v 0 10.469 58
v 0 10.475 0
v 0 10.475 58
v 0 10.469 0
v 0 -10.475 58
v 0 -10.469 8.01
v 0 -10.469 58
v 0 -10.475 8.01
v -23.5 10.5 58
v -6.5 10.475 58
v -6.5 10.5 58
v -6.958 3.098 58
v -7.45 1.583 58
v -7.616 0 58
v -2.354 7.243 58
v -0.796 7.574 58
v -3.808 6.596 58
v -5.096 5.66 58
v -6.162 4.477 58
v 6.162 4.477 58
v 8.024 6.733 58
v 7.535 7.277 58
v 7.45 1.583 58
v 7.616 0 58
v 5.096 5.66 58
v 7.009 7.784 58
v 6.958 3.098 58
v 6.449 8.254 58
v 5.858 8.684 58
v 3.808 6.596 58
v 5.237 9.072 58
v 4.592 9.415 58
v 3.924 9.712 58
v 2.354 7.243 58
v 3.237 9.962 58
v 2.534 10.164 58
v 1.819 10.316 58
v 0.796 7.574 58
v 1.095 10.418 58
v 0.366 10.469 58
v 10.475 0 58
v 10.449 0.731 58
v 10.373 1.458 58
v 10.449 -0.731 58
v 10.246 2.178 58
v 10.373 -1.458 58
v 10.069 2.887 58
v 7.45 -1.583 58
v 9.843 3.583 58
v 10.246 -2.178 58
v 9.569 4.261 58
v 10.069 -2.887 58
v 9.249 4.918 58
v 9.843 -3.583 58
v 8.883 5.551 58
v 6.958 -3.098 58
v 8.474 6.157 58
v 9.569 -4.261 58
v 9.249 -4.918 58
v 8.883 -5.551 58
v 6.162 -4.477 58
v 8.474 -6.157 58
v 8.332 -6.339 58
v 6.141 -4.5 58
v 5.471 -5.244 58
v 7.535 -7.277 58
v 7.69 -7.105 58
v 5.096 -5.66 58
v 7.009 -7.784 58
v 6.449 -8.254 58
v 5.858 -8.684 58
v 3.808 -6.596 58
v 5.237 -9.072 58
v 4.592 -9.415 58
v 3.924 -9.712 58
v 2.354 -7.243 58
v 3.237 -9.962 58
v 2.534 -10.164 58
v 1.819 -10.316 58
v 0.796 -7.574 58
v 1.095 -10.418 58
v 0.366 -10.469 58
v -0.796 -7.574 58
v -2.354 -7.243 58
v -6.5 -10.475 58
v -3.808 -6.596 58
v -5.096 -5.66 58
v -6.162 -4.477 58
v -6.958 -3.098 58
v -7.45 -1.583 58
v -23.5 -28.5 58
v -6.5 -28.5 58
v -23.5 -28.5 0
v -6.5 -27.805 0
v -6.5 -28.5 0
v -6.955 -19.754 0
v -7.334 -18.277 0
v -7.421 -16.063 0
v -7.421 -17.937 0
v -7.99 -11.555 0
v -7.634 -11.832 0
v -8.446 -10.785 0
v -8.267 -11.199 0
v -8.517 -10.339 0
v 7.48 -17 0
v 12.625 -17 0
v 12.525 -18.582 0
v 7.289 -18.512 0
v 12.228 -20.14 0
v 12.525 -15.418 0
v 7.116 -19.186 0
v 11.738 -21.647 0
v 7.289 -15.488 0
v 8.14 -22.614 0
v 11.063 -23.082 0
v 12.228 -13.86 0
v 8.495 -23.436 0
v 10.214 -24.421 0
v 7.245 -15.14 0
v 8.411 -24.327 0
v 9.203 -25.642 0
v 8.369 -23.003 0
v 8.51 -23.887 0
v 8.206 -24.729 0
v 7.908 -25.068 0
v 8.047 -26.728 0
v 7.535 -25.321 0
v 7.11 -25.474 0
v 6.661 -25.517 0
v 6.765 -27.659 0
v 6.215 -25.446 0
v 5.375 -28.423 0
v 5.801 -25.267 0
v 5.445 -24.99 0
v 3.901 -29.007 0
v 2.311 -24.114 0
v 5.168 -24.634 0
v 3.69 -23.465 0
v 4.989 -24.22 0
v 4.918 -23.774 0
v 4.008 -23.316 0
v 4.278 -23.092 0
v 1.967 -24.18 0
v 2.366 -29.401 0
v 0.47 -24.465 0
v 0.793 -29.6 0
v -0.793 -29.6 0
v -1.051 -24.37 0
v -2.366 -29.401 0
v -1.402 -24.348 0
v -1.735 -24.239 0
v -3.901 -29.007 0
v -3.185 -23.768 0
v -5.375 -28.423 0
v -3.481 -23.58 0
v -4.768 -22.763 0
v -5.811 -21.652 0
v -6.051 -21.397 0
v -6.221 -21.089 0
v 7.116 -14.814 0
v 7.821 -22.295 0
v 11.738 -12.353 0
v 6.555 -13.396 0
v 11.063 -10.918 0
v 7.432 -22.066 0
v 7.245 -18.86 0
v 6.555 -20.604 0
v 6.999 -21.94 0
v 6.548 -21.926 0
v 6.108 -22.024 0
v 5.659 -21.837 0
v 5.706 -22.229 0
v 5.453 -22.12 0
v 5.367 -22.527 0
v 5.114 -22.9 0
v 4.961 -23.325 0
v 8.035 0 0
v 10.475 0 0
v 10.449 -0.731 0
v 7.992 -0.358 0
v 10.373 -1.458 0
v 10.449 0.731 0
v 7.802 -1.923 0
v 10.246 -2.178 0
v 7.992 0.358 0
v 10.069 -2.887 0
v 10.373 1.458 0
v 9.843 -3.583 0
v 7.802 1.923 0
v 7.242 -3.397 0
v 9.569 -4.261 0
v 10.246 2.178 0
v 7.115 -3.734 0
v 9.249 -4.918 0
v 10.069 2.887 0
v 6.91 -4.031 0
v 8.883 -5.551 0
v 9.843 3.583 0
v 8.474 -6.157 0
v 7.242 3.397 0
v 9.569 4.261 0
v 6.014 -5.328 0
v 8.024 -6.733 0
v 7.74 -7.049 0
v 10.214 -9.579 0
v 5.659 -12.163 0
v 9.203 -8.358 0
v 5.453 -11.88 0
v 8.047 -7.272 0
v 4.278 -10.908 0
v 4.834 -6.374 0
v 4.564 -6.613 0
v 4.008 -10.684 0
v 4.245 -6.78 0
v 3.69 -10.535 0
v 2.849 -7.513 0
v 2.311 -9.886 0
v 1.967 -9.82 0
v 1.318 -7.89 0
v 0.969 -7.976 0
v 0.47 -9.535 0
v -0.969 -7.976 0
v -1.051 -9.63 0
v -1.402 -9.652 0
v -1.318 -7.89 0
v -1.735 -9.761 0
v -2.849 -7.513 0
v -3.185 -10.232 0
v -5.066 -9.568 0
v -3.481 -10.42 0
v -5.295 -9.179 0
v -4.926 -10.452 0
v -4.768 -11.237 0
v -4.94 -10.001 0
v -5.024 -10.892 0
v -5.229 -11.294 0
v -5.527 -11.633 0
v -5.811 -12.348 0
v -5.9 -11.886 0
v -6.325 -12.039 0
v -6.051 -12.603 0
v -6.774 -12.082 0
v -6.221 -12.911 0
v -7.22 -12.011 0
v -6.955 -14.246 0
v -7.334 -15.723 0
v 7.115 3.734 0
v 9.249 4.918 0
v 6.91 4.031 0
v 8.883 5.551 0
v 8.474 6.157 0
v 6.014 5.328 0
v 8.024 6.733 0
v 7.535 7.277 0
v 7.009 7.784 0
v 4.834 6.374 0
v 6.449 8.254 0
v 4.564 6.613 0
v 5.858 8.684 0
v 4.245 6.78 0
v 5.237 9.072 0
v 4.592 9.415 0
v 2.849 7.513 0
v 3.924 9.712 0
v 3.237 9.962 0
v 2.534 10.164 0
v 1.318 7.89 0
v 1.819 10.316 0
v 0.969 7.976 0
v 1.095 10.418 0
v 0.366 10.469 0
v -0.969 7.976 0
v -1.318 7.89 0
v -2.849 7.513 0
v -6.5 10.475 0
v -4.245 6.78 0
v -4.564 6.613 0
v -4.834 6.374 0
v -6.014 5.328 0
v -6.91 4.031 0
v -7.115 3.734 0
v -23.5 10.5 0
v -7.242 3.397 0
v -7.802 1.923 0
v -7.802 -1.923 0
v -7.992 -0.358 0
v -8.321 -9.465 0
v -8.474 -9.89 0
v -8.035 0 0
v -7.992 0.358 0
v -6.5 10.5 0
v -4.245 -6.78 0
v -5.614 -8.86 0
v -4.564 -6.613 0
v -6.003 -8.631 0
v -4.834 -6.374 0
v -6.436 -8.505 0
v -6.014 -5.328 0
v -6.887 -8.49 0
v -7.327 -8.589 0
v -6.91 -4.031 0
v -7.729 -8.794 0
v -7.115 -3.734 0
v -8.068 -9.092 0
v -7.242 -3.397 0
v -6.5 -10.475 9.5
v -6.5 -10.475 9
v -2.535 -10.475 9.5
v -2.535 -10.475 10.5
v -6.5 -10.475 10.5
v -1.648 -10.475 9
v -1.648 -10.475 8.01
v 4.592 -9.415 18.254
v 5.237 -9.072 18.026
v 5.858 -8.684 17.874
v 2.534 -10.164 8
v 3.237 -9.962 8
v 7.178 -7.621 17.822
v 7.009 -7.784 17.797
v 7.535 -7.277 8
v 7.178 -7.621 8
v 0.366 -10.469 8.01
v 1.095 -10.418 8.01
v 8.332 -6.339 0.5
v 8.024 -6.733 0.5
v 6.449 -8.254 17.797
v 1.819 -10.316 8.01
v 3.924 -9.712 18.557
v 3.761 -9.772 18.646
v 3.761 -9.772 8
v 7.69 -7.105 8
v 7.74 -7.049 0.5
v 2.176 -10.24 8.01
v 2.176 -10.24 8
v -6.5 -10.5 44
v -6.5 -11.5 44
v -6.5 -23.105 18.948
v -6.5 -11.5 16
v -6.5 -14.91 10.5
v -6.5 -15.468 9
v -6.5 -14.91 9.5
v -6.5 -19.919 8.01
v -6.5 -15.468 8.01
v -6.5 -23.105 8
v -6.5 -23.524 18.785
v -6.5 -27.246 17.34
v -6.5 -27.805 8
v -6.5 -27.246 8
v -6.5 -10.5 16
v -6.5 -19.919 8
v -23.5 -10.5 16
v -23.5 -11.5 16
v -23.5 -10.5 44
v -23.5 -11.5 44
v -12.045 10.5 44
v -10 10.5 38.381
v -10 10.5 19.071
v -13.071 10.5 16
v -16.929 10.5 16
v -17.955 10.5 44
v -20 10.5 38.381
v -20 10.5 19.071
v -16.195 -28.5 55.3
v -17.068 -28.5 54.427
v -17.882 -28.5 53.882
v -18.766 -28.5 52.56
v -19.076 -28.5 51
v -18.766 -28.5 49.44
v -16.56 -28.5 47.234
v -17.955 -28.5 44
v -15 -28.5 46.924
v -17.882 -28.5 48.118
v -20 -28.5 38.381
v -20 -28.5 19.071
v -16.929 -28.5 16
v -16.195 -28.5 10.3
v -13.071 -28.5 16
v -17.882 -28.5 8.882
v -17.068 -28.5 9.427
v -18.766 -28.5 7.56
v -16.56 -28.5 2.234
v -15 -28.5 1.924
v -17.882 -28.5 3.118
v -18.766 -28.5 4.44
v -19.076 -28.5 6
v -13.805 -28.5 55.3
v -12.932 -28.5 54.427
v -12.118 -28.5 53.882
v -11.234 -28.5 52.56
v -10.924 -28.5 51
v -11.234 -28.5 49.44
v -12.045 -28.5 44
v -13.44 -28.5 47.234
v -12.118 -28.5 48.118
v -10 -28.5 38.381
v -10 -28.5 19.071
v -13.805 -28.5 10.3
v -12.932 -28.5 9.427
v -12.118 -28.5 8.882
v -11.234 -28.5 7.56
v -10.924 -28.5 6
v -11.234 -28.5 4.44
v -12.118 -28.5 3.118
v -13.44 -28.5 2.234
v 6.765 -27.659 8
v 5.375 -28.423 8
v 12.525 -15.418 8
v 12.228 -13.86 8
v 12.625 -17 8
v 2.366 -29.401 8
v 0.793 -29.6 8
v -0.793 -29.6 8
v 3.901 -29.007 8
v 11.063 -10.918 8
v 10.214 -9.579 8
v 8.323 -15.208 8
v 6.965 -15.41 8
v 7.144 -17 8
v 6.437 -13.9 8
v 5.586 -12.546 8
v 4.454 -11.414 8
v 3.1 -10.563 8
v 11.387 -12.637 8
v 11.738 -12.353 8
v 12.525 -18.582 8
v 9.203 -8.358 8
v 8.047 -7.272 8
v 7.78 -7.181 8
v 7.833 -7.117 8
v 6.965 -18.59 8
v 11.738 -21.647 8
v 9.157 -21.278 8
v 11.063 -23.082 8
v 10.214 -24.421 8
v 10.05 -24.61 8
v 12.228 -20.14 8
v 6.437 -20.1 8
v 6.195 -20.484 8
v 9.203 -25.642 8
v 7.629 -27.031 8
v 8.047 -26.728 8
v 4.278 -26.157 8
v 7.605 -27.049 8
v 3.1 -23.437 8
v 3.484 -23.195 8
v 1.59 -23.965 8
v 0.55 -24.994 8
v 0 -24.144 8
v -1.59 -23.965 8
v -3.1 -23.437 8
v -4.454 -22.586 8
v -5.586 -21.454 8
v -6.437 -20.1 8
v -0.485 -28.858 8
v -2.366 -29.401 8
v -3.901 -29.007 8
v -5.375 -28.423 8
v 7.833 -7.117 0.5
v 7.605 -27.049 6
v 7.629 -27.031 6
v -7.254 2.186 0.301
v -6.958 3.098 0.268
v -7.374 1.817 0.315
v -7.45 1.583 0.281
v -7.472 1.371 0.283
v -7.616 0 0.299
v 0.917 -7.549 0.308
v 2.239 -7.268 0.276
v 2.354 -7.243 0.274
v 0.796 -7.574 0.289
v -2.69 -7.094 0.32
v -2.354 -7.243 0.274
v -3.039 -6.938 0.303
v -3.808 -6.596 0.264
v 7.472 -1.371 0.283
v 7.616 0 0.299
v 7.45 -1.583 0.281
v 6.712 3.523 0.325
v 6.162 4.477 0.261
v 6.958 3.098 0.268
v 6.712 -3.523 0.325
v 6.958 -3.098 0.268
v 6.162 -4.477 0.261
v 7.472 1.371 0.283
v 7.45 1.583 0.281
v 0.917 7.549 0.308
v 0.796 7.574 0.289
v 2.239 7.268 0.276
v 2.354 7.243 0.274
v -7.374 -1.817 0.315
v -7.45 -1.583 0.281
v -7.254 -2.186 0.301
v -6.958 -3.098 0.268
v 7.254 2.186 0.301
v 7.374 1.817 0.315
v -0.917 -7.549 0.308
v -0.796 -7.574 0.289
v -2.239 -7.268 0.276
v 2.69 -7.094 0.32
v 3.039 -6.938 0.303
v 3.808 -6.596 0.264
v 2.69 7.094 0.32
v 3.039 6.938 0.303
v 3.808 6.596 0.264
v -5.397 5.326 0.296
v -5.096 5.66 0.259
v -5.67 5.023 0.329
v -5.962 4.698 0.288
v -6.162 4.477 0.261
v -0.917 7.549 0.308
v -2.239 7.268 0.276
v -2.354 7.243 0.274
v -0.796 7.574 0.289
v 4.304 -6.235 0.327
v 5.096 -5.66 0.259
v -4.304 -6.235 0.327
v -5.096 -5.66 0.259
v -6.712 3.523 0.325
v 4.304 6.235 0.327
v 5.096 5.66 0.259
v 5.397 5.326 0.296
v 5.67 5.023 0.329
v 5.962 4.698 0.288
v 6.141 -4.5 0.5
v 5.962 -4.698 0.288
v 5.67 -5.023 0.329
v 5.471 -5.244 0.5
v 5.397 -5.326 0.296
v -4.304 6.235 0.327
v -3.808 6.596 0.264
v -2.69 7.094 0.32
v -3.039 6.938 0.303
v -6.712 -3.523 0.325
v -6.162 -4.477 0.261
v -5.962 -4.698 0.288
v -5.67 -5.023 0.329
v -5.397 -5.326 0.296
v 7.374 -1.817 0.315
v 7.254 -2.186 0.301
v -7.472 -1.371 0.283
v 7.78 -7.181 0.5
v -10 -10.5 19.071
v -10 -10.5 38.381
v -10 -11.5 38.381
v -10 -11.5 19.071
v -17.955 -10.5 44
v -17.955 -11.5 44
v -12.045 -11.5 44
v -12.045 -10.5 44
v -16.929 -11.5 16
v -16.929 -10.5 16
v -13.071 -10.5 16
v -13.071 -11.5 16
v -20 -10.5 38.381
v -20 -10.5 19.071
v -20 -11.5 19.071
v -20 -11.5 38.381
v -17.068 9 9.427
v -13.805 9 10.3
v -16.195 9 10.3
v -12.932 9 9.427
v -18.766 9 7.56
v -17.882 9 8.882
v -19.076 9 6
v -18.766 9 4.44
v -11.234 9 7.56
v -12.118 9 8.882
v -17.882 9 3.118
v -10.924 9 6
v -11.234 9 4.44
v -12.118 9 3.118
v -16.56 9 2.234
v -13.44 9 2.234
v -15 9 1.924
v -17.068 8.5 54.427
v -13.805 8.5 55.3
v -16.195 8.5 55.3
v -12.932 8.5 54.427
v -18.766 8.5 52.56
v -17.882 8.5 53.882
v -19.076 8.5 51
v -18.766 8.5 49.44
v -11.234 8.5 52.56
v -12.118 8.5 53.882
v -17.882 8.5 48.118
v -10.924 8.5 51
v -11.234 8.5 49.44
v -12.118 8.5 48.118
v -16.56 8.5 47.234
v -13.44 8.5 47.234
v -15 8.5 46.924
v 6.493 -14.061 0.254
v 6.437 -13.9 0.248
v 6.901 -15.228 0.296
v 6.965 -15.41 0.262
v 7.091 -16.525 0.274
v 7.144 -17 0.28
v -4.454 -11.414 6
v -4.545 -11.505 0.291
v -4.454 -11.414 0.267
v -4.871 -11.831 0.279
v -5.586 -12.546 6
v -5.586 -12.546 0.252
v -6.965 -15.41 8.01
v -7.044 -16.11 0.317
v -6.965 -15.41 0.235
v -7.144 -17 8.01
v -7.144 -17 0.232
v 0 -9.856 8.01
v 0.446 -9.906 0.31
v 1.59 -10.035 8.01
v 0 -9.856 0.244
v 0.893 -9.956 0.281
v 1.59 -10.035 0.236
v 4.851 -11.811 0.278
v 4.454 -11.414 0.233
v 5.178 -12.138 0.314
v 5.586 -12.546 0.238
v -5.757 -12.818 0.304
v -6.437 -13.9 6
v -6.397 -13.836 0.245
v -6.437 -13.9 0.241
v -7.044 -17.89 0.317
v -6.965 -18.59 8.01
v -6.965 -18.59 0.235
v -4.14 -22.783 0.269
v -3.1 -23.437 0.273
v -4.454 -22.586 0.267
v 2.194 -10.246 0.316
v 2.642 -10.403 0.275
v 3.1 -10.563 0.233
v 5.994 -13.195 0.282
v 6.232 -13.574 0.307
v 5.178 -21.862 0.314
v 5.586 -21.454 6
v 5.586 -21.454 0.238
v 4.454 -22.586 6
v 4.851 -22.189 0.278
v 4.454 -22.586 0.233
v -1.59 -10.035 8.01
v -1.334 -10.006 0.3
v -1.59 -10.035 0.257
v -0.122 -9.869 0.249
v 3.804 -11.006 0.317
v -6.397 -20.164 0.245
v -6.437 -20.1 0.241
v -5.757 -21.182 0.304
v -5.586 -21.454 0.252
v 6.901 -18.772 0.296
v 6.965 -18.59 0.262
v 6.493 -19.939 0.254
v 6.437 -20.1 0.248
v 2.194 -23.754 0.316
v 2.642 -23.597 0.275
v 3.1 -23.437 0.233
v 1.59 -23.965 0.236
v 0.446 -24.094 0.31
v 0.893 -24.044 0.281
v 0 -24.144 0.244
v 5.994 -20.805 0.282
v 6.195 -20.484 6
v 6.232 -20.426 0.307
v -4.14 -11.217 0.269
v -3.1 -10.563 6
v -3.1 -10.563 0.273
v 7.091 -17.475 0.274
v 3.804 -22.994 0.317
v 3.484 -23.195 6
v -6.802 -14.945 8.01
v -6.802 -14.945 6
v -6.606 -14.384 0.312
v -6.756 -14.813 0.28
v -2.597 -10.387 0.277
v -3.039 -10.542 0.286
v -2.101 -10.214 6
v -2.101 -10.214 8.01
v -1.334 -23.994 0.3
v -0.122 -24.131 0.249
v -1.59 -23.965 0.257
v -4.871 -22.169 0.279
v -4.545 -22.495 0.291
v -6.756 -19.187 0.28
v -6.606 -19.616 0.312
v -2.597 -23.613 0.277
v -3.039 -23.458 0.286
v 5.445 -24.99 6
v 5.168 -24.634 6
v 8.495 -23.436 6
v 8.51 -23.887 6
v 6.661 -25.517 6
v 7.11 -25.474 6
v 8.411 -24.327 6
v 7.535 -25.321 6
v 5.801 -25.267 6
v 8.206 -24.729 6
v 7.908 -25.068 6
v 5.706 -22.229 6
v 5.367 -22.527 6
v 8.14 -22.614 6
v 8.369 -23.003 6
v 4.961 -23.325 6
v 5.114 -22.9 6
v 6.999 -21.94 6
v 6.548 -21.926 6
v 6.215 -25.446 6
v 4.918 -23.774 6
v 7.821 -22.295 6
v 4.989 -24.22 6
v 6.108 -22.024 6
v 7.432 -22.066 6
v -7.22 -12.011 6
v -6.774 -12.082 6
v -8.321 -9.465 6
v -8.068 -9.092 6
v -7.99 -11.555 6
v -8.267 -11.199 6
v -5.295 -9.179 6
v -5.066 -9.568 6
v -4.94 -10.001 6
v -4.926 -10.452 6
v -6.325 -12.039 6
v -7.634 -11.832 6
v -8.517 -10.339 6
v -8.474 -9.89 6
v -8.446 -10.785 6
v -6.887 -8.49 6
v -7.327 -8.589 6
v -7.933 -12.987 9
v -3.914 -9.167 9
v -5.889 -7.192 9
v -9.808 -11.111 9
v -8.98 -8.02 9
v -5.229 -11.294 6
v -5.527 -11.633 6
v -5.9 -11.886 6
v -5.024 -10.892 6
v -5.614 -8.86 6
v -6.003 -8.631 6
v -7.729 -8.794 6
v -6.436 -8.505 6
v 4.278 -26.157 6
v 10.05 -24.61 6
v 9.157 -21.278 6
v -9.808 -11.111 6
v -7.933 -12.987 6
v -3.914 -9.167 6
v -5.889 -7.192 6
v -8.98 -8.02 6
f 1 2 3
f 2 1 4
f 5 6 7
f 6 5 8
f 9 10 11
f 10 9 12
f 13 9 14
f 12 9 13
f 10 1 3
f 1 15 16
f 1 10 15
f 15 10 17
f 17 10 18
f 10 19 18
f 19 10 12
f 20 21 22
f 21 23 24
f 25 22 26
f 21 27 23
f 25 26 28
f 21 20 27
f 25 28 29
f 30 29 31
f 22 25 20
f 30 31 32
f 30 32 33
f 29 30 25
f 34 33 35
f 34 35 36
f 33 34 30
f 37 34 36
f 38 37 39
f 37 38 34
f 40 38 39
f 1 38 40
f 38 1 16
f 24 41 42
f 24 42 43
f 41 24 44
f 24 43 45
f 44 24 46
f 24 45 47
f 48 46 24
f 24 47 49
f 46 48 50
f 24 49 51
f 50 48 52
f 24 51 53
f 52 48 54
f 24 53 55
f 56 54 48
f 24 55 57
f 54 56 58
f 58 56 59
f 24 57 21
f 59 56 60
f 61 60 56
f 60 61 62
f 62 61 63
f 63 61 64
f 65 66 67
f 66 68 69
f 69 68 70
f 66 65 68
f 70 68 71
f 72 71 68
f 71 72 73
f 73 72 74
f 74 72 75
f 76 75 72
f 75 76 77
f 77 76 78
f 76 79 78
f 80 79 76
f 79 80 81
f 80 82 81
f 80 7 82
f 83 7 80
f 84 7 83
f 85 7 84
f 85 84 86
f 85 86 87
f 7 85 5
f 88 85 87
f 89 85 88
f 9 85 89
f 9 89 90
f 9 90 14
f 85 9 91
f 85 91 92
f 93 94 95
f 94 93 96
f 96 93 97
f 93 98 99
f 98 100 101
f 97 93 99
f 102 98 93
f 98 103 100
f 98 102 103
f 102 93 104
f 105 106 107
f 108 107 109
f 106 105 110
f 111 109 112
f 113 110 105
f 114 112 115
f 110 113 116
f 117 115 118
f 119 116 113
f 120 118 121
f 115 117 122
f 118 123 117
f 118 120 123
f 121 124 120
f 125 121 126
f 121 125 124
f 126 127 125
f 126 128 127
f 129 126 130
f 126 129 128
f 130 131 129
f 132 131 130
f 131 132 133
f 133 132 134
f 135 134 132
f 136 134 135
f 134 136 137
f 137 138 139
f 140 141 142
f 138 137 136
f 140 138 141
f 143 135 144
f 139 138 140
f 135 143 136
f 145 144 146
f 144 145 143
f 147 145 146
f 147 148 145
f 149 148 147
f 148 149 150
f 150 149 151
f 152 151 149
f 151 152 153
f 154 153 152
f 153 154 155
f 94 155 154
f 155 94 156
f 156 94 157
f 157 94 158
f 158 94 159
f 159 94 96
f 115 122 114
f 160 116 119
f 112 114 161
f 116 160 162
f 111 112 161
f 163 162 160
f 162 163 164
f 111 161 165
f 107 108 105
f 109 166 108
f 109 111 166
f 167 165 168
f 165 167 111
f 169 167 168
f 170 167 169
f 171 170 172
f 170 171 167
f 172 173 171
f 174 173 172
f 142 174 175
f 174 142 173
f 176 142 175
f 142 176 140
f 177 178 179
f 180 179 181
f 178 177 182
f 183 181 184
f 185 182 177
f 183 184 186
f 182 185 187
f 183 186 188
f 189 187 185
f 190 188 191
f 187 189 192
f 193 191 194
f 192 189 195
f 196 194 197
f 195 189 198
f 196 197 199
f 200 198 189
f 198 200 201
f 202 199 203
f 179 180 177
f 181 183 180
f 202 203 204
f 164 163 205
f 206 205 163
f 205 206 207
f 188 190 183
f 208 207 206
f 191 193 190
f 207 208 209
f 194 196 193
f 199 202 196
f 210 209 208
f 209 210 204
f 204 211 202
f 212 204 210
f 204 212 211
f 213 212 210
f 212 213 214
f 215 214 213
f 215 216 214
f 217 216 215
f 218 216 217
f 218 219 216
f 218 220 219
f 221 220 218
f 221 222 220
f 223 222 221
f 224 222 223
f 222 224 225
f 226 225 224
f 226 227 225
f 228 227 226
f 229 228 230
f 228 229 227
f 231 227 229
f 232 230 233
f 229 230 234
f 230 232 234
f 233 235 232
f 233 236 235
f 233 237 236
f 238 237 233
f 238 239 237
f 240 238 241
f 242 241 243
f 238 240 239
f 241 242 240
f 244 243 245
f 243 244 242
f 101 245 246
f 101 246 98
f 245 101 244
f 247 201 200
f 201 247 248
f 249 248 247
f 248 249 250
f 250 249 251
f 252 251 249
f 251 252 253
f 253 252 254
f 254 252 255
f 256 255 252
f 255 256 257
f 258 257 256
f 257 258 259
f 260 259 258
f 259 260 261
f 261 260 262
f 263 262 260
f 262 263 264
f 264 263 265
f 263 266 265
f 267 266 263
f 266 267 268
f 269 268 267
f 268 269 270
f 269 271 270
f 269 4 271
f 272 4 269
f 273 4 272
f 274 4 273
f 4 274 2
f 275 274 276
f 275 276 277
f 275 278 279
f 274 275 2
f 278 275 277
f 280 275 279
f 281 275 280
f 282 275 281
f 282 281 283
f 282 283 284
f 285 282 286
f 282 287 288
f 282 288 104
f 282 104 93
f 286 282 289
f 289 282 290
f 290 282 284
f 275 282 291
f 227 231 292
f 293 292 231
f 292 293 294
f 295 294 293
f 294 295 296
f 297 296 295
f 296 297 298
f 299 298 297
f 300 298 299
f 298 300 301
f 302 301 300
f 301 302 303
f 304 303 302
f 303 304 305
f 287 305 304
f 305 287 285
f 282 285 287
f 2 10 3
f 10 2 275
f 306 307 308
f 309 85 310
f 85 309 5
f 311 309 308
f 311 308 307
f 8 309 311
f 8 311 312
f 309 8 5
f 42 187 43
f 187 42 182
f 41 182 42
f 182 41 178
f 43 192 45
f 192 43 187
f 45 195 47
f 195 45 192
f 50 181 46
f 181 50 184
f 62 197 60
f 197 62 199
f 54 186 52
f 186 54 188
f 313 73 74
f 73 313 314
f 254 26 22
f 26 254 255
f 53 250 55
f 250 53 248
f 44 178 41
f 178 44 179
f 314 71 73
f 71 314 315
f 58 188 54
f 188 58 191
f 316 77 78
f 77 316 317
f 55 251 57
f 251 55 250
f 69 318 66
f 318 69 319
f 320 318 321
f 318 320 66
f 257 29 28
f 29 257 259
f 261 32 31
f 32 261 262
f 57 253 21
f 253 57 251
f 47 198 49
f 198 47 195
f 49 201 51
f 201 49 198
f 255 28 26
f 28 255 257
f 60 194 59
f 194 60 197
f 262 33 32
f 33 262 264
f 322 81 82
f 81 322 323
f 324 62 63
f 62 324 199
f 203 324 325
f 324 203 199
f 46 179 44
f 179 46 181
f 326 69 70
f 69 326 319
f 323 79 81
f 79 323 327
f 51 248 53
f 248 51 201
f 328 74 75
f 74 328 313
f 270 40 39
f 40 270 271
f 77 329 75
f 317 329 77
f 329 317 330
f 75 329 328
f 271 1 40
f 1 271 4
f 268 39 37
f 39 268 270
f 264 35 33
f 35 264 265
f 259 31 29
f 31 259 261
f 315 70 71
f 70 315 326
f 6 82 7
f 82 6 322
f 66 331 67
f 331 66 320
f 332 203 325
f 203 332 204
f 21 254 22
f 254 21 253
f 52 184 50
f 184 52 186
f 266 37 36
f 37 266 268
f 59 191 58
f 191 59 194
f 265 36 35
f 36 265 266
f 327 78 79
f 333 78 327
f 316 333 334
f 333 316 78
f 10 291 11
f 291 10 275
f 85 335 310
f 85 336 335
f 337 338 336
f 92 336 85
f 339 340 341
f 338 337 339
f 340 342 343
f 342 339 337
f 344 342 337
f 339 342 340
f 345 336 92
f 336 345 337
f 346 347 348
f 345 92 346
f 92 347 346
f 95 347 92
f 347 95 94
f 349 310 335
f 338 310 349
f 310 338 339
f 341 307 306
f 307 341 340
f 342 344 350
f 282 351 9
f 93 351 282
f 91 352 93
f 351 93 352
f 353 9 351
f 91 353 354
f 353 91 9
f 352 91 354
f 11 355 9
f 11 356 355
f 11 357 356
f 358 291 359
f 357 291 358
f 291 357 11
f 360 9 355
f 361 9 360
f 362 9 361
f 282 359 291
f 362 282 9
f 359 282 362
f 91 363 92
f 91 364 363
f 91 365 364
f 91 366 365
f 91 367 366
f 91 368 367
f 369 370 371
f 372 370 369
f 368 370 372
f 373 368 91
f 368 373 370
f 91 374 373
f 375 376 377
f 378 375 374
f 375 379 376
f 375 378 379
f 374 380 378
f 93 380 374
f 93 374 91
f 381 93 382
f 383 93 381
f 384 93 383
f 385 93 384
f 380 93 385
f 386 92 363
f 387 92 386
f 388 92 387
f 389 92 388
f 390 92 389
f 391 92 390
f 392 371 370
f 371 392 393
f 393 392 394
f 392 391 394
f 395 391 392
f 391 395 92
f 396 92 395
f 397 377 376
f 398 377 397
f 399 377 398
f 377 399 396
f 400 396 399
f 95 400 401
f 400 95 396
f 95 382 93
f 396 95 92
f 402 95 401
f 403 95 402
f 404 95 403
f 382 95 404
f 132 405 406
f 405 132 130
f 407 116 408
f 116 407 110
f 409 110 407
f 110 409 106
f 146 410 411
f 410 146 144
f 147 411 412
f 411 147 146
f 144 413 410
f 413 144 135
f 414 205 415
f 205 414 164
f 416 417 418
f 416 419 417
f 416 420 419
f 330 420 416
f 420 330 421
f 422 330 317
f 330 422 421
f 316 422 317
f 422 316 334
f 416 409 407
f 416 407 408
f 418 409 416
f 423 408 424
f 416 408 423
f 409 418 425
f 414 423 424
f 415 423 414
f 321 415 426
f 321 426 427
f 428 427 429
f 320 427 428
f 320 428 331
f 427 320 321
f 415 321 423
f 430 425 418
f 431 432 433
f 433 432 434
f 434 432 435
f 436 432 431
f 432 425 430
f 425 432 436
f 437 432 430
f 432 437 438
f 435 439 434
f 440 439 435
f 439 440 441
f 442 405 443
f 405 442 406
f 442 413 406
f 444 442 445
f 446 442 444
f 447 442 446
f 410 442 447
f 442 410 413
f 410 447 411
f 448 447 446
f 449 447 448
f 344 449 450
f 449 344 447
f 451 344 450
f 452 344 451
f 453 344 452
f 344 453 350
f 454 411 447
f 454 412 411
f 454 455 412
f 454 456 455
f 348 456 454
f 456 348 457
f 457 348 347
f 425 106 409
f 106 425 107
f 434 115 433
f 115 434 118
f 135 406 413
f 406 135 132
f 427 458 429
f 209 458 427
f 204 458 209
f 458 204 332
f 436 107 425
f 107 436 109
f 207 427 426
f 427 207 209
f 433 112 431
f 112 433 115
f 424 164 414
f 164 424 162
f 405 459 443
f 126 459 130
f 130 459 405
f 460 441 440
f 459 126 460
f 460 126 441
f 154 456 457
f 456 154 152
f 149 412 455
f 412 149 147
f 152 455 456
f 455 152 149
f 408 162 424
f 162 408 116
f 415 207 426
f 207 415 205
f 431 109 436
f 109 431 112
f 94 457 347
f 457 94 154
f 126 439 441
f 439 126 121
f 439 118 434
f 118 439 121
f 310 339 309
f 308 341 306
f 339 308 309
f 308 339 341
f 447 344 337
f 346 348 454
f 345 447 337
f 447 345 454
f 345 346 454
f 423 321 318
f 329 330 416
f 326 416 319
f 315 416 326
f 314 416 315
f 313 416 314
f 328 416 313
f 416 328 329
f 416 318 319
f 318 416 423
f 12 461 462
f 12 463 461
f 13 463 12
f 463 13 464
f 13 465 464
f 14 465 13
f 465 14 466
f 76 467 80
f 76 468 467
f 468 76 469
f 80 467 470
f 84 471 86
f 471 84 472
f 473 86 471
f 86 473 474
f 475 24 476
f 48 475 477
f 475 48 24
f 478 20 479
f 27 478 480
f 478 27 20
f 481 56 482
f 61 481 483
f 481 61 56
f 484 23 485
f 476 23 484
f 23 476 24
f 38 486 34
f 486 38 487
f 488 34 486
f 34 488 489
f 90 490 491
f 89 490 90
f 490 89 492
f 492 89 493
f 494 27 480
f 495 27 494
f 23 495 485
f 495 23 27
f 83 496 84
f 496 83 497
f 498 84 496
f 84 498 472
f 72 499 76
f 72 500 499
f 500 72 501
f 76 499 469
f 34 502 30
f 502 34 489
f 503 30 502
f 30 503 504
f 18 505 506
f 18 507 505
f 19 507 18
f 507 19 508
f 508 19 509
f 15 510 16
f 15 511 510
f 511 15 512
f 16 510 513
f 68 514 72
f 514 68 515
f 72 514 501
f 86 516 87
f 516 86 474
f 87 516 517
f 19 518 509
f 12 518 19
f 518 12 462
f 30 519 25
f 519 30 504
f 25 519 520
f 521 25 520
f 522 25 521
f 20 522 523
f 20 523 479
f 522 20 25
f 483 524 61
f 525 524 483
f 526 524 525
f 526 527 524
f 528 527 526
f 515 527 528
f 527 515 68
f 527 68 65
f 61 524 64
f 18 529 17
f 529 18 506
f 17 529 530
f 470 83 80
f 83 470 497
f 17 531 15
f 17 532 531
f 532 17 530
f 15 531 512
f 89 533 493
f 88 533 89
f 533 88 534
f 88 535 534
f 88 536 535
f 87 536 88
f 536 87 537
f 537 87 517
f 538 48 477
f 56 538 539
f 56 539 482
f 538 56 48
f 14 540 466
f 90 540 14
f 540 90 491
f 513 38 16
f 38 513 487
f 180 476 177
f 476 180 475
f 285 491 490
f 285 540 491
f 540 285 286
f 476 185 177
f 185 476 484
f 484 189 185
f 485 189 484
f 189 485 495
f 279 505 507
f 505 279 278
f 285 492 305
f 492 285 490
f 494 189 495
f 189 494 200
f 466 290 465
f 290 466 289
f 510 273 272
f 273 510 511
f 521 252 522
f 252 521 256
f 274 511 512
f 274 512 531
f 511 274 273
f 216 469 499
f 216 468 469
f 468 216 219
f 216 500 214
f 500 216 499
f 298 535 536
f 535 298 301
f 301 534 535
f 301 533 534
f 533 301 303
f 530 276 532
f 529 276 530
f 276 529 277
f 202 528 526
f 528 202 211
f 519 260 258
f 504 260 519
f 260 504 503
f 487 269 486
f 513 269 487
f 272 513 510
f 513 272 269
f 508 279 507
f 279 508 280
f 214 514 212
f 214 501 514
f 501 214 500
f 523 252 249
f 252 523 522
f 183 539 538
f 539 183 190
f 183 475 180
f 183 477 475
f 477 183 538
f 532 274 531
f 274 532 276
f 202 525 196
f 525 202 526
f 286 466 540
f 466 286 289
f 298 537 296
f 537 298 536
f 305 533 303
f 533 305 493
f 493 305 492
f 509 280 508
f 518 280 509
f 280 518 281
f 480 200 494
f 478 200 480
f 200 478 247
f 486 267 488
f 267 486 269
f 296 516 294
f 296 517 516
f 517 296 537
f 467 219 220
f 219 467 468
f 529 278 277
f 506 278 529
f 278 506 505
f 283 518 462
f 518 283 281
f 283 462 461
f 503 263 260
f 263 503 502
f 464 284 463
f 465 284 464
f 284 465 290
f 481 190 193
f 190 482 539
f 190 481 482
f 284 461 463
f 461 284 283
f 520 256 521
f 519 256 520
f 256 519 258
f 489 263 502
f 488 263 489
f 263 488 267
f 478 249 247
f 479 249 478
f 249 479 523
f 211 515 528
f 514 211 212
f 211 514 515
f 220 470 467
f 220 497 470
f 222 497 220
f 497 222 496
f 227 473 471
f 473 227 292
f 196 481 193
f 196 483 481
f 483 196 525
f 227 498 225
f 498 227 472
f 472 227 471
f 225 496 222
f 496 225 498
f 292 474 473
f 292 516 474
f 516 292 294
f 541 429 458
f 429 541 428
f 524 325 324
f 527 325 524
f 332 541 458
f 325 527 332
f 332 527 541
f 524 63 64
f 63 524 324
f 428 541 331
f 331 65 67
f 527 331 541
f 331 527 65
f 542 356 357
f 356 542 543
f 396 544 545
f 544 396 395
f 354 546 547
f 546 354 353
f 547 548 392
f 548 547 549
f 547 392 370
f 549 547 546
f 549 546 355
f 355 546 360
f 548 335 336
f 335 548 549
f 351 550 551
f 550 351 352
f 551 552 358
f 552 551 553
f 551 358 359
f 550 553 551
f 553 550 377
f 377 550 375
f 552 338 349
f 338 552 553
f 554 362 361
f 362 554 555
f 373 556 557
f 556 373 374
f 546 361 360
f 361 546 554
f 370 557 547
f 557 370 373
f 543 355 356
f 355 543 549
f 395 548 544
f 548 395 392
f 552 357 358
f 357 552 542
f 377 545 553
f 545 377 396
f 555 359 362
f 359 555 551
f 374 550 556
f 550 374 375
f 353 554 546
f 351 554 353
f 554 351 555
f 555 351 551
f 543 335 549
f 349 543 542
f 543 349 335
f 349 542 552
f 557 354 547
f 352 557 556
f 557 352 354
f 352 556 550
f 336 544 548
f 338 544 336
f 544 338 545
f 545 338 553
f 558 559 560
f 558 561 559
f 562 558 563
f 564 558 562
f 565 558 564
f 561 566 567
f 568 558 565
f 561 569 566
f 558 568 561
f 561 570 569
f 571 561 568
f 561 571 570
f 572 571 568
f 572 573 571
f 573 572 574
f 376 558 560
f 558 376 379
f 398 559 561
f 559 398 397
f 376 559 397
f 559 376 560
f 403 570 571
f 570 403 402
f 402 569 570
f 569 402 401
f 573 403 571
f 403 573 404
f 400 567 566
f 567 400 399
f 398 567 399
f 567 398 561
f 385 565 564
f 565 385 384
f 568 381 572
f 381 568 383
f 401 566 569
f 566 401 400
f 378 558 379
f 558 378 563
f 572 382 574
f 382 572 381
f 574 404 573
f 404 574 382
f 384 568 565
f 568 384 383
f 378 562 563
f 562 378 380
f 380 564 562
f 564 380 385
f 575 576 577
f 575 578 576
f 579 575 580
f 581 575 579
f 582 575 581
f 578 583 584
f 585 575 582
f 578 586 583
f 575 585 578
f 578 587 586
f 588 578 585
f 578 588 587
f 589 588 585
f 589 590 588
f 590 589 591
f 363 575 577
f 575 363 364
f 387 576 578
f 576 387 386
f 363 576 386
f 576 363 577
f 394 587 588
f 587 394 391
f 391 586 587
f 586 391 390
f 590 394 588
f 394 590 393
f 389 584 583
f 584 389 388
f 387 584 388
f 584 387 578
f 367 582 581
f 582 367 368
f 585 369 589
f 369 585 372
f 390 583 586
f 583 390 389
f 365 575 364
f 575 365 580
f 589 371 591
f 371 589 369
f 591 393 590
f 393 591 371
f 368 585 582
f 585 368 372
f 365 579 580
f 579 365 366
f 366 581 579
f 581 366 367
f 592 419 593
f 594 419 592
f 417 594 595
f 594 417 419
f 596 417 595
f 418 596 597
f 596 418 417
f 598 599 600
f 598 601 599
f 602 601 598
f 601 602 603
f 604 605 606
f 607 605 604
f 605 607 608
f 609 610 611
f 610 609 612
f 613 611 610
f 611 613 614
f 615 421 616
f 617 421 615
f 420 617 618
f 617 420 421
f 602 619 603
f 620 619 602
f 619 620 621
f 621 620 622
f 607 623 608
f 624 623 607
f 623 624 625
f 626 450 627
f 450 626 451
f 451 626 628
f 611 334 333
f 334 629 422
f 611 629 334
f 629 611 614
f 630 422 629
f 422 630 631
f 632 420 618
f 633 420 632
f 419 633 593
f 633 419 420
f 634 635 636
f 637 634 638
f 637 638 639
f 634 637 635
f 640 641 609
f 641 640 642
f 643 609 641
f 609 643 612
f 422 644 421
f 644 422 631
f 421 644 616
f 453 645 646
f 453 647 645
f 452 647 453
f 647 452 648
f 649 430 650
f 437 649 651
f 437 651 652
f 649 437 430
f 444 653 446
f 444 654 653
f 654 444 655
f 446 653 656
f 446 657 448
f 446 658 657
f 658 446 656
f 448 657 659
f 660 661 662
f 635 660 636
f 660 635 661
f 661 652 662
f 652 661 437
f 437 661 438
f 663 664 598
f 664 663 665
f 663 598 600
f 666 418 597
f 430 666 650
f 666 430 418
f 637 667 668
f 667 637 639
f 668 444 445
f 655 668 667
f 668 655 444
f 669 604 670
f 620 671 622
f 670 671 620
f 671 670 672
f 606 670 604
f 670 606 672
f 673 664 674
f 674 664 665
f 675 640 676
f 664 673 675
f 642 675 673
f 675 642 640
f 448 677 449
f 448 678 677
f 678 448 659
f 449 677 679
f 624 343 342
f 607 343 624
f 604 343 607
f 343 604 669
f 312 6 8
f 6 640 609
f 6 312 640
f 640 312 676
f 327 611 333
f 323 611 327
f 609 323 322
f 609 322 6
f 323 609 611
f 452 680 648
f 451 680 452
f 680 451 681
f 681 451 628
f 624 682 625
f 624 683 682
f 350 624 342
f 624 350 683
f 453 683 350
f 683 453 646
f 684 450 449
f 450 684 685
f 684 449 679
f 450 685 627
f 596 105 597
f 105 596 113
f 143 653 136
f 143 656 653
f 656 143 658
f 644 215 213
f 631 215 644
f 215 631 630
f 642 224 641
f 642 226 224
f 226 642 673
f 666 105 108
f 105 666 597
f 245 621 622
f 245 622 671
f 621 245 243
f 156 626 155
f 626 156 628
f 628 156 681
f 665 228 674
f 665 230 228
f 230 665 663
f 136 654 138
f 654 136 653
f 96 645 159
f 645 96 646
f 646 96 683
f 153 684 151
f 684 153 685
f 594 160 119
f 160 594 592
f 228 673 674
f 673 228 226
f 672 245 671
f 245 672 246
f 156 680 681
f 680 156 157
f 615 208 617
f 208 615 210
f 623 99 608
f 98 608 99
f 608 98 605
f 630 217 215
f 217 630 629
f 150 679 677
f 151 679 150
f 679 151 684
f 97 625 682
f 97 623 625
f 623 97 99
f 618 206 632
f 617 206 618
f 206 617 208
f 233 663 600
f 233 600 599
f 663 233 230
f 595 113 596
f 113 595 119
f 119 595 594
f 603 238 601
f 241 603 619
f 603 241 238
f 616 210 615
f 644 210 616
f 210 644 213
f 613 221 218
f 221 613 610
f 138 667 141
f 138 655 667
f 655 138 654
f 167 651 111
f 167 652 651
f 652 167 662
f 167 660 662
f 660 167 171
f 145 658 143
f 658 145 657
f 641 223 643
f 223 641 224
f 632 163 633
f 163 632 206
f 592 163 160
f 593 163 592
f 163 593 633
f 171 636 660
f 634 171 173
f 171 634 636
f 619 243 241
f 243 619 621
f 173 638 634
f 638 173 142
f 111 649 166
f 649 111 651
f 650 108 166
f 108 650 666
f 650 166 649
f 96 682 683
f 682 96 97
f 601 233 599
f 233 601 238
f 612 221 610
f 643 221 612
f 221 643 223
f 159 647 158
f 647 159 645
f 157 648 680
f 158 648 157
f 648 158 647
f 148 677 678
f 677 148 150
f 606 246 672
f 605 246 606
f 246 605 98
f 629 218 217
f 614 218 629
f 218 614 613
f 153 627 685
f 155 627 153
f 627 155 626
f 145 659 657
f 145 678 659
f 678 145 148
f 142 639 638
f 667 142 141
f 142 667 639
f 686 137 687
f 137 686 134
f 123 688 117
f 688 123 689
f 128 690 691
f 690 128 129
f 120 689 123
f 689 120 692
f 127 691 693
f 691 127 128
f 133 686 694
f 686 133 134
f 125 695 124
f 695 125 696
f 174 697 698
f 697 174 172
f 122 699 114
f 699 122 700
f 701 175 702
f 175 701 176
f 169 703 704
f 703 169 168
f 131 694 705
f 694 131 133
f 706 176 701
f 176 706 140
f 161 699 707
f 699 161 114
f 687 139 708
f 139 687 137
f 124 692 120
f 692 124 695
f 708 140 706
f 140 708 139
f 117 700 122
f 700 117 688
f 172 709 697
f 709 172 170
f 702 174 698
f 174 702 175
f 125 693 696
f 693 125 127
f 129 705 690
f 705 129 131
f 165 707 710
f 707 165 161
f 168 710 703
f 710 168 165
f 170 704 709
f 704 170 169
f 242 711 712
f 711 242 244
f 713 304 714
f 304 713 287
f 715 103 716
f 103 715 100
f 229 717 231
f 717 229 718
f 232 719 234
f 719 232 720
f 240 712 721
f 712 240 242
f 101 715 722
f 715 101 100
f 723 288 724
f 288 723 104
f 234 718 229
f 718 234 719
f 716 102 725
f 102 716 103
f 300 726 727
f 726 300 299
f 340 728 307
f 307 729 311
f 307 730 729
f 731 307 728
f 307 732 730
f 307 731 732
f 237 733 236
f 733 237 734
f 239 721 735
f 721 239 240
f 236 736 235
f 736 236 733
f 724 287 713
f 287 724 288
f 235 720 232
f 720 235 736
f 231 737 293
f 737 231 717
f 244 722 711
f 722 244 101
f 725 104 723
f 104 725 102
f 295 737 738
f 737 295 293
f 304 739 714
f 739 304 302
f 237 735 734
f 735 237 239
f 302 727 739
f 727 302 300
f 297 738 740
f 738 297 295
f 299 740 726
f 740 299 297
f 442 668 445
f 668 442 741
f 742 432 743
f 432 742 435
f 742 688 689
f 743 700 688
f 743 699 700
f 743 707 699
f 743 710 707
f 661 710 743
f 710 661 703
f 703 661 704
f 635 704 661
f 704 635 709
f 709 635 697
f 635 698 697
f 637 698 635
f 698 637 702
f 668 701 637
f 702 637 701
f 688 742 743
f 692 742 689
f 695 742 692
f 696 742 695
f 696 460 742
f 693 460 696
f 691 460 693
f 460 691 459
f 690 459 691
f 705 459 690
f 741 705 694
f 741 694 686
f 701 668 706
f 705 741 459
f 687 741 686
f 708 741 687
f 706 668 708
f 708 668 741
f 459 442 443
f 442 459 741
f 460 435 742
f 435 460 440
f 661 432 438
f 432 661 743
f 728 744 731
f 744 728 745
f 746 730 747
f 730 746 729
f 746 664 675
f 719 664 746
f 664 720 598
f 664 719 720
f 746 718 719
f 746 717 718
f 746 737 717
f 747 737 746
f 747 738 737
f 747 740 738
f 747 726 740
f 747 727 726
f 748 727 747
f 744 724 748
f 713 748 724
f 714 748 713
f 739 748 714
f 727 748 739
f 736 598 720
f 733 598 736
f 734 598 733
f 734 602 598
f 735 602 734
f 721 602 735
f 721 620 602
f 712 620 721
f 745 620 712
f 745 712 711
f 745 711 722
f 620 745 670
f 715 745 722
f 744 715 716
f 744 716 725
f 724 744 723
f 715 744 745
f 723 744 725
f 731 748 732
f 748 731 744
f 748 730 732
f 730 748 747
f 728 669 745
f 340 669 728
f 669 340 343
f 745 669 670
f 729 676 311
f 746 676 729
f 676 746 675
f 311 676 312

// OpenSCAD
// file: polyholes.scad
//
// Mendel90
//
// GNU GPL v2
// nop.head@gmail.com
// hydraraptor.blogspot.com
//
// See http://hydraraptor.blogspot.com/2011/02/polyholes.html
//
function sides(r) = max(round(4 *r),3);
function correctedRadius(r,n) = 0.1 + r / cos(180 / n);
function correctedDiameter(d) = 0.2 + d / cos(180 / sides(d / 2));

module polyCircle(r, center = false) {
    n = sides(r);
    circle(r = correctedRadius(r,n), $fn = n, center = center);
}

module poly_circle(r, center = false) {
    polyCircle(r, center);
}

module polyCylinder(r, h, center = false) {
    n = sides(r);
    cylinder(h = h, r = correctedRadius(r,n), $fn = n, center = center);
}

module poly_cylinder(r, h, center = false) {
    polyCylinder(r,h,center);
}

module polydCylinder(r, center = false) {
    n = sides(r);
    r = correctedRadius(r,n);
    cylinder(h = h, r = r, $fn = n, center = center);
    translate([0, -r, 0])
        cube([r, 2 * r, h]);
}

module poly_d_cylinder(r, center = false) {
    polydCylinder(r,center);
}
// file: bearing.scad
// PRUSA iteration3
// Bearing holders
// GNU GPL v3
// Josef Průša <iam@josefprusa.cz> and contributors
// http://www.reprap.org/wiki/Prusa_Mendel
// http://prusamendel.org

use <polyholes.scad>

bearing_diameter = 14.95;

module horizontal_bearing_base(bearings=1){
    translate([0,0,6]) cube([24,8+bearings*25,12],center=true);
}

module horizontal_bearing_holes(bearings=1){
    cutter_lenght = 10+bearings*25;
    one_holder_lenght = 8+25;
    holder_lenght = 8+bearings*25;

    // Main bearing cut
    difference(){
        translate([0,0,12]) rotate([90,0,0]) translate([0,0,-cutter_lenght/2]) cylinder(h=cutter_lenght,r=(bearing_diameter/2)+0.2,$fn=50);

        // Bearing retainers
        translate([0,1-holder_lenght/2,3]) cube([24,6,8],center=true);
        translate([0,-1+holder_lenght/2,3]) cube([24,6,8],center=true);
    }

    // Ziptie cutouts
    ziptie_cut_ofset = 0;
    for (i=[0:bearings-1]){
        // For easier positioning I move them by half of one
        // bearing holder then add each bearign lenght and then center again
        translate([0,-holder_lenght/2,0]) translate([0,one_holder_lenght/2+i*25,0]) difference(){
            union(){
                translate([0,2-8.5,12]) rotate([90,0,0]) translate([0,0,0]) cylinder(h=4,r=11.5,$fn=50);
                translate([0,2+8.5,12]) rotate([90,0,0]) translate([0,0,0]) cylinder(h=4,r=11.5,$fn=50);
            }
            translate([0,12,12]) rotate([90,0,0]) translate([0,0,0]) cylinder(h = 24,r=9,$fn=50);
        }
    }
}

module horizontal_bearing_holes_nozip(bearings=1){
    cutter_lenght = 10+bearings*25;
    one_holder_lenght = 8+25;
    holder_lenght = 8+bearings*25;

    // Main bearing cut
    difference(){
        translate([0,0,12]) rotate([90,0,0]) translate([0,0,-cutter_lenght/2]) cylinder(h = cutter_lenght,r=(bearing_diameter/2)+0.2,$fn=50);

        // Bearing retainers
        translate([0,1-holder_lenght/2,3]) cube([24,6,8],center=true);
        translate([0,-1+holder_lenght/2,3]) cube([24,6,8],center=true);
    }

}

thinwall = 3;
bearing_size = bearing_diameter+2*thinwall;

module vertical_bearing_base(){
    translate([-2-bearing_size/4,0,29]) cube([4+bearing_size/2,bearing_size,58],center=true);
    cylinder(h=58,r=bearing_size/2,$fn = 90);
}

module vertical_bearing_holes(){
    translate([0,0,-1]) poly_cylinder(h = 62,r=(bearing_diameter/2));
    translate([0,0,-0.1]) cylinder(r1=(bearing_diameter/2)+0.7,r2=(bearing_diameter/2),h=0.5);
    rotate([0,0,-40]) translate([bearing_diameter/2-2.9,-0.5,0.5]) cube([thinwall*2,1,62]);
}

//difference(){
//vertical_bearing_base();
//vertical_bearing_holes();
//}
//horizontal_bearing_test();
//horizontal_bearing_base(1);
//horizontal_bearing_holes(1);
horizontal_bearing_holes_nozip(1);
// main file
// PRUSA iteration3
// X end prototype
// GNU GPL v3
// Josef Průša <iam@josefprusa.cz> and contributors
// http://www.reprap.org/wiki/Prusa_Mendel
// http://prusamendel.org

use <bearing.scad>
use <polyholes.scad>
rod_distance = 45;

module x_end_base(){
    // Main block
    height=58;
    translate([-15,-9,height/2]) cube([17,39,height],center=true);
    // Bearing holder
    vertical_bearing_base();
    // Nut trap
    // Cylinder
    translate([0,-17,0]) poly_cylinder(h = 8,r=12.5,$fn=25);
    // Hexagon
    // translate([0,-17,0]) rotate([0,0,30]) cylinder(h=8,r=8,$fn=6);
    translate([-6,-10.6,10]) rotate([0,0,48.2]) cube([10,5,1],center=true);

    rotate([90,0,-15,]) translate([-1,8,24]) linear_extrude(height=4) polygon(points=[[0,0],[0,12],[8,0]]); // Vzpera lozisek
    rotate([90,0,-50,]) translate([9,8,-0.6]) linear_extrude(height=4) polygon(points=[[0,0],[0,12],[8,0]]);

}

module reinforcement_selective_infill(){
    rotate([90,0,-15,]) translate([-1.5,8,26]) linear_extrude(height=0.2) polygon(points=[[-2,0],[0,12],[8,0]]); // Vzpera lozisek

    rotate([90,0,-50,]) translate([8.5,8,1.4]) linear_extrude(height=0.2) polygon(points=[[0,0],[0,12],[12,0]]); // Vzpera tela

}

   //reinforcement_selective_infill();

module x_end_holes(){
    vertical_bearing_holes();
    // Belt hole
    translate([-1,0,0]){
    // Stress relief
        translate([-5.5-10+1.5,-10-1,30]) cube([18,1,28],center=true);
        difference(){
            translate([-5.5-10+1.5,-10,30]) cube([10,46,28],center=true);

            // Nice edges
            translate([-5.5-10+1.5-5,-10,30+23]) rotate([0,20,0]) cube([10,46,28],center=true);
            translate([-5.5-10+1.5+5,-10,30+23]) rotate([0,-20,0]) cube([10,46,28],center=true);
            translate([-5.5-10+1.5,-10,30-23]) rotate([0,45,0]) cube([10,46,28],center=true);
            translate([-5.5-10+1.5,-10,30-23]) rotate([0,-45,0]) cube([10,46,28],center=true);
        }
    }

    // Bottom pushfit rod
    translate([-15,-41,6]) rotate([-90,0,0]) pushfit_rod(7.8,50);
    // Top pushfit rod
    translate([-15,-41.5,rod_distance+6]) rotate([-90,0,0]) pushfit_rod(7.8,50);

    // TR Nut trap
    // Hole for the nut
    translate([0,-17,-1]) poly_cylinder(h=9.01,r=7,$fn=25);
    translate([0,-17,-0.1]) cylinder(h=0.5,r1=6.8+0.8,r2=7,$fn=25);

    // Screw holes for TR nut
    translate([0,-17,0]) rotate([0,0,-135]) translate([0,9.5,-1]) cylinder(h=10,r=1.8,$fn=25);
    translate([0,-17,0]) rotate([0,0,-135]) translate([0,-9.5,-1]) cylinder(h=10,r=1.8,$fn=25);

    // Nut traps for TR nut screws
    translate([0,-17,0]) rotate([0,0,-135]) translate([0,9.5,6]) rotate([0,0,0]) cylinder(h=3,r=3.45,$fn=6);

    translate([0,-17, 0]) rotate([0,0,-135]) translate([0,-9.5,6]) rotate([0,0,30])cylinder(h=3,r=3.2,$fn=6);
    translate([-5.5,-17.2,6]) rotate([0,0,30]) cube([5,5,3]);
    translate([-0,-17.2,6]) rotate([0,0,60]) cube([5,10,3]);
}


// Final prototype
module x_end_plain(){
    difference(){
        x_end_base();
        x_end_holes();
    }
}

x_end_plain();

module pushfit_rod(diameter,length){
    poly_cylinder(h=length,r=diameter/2);
    difference(){
        translate([0,-diameter/2.85,length/2]) rotate([0,0,45]) cube([diameter/2,diameter/2,length],center=true);
        translate([0,-diameter/4-diameter/2-0.4,length/2]) rotate([0,0,0]) cube([diameter,diameter/2,length],center=true);
    }
}
